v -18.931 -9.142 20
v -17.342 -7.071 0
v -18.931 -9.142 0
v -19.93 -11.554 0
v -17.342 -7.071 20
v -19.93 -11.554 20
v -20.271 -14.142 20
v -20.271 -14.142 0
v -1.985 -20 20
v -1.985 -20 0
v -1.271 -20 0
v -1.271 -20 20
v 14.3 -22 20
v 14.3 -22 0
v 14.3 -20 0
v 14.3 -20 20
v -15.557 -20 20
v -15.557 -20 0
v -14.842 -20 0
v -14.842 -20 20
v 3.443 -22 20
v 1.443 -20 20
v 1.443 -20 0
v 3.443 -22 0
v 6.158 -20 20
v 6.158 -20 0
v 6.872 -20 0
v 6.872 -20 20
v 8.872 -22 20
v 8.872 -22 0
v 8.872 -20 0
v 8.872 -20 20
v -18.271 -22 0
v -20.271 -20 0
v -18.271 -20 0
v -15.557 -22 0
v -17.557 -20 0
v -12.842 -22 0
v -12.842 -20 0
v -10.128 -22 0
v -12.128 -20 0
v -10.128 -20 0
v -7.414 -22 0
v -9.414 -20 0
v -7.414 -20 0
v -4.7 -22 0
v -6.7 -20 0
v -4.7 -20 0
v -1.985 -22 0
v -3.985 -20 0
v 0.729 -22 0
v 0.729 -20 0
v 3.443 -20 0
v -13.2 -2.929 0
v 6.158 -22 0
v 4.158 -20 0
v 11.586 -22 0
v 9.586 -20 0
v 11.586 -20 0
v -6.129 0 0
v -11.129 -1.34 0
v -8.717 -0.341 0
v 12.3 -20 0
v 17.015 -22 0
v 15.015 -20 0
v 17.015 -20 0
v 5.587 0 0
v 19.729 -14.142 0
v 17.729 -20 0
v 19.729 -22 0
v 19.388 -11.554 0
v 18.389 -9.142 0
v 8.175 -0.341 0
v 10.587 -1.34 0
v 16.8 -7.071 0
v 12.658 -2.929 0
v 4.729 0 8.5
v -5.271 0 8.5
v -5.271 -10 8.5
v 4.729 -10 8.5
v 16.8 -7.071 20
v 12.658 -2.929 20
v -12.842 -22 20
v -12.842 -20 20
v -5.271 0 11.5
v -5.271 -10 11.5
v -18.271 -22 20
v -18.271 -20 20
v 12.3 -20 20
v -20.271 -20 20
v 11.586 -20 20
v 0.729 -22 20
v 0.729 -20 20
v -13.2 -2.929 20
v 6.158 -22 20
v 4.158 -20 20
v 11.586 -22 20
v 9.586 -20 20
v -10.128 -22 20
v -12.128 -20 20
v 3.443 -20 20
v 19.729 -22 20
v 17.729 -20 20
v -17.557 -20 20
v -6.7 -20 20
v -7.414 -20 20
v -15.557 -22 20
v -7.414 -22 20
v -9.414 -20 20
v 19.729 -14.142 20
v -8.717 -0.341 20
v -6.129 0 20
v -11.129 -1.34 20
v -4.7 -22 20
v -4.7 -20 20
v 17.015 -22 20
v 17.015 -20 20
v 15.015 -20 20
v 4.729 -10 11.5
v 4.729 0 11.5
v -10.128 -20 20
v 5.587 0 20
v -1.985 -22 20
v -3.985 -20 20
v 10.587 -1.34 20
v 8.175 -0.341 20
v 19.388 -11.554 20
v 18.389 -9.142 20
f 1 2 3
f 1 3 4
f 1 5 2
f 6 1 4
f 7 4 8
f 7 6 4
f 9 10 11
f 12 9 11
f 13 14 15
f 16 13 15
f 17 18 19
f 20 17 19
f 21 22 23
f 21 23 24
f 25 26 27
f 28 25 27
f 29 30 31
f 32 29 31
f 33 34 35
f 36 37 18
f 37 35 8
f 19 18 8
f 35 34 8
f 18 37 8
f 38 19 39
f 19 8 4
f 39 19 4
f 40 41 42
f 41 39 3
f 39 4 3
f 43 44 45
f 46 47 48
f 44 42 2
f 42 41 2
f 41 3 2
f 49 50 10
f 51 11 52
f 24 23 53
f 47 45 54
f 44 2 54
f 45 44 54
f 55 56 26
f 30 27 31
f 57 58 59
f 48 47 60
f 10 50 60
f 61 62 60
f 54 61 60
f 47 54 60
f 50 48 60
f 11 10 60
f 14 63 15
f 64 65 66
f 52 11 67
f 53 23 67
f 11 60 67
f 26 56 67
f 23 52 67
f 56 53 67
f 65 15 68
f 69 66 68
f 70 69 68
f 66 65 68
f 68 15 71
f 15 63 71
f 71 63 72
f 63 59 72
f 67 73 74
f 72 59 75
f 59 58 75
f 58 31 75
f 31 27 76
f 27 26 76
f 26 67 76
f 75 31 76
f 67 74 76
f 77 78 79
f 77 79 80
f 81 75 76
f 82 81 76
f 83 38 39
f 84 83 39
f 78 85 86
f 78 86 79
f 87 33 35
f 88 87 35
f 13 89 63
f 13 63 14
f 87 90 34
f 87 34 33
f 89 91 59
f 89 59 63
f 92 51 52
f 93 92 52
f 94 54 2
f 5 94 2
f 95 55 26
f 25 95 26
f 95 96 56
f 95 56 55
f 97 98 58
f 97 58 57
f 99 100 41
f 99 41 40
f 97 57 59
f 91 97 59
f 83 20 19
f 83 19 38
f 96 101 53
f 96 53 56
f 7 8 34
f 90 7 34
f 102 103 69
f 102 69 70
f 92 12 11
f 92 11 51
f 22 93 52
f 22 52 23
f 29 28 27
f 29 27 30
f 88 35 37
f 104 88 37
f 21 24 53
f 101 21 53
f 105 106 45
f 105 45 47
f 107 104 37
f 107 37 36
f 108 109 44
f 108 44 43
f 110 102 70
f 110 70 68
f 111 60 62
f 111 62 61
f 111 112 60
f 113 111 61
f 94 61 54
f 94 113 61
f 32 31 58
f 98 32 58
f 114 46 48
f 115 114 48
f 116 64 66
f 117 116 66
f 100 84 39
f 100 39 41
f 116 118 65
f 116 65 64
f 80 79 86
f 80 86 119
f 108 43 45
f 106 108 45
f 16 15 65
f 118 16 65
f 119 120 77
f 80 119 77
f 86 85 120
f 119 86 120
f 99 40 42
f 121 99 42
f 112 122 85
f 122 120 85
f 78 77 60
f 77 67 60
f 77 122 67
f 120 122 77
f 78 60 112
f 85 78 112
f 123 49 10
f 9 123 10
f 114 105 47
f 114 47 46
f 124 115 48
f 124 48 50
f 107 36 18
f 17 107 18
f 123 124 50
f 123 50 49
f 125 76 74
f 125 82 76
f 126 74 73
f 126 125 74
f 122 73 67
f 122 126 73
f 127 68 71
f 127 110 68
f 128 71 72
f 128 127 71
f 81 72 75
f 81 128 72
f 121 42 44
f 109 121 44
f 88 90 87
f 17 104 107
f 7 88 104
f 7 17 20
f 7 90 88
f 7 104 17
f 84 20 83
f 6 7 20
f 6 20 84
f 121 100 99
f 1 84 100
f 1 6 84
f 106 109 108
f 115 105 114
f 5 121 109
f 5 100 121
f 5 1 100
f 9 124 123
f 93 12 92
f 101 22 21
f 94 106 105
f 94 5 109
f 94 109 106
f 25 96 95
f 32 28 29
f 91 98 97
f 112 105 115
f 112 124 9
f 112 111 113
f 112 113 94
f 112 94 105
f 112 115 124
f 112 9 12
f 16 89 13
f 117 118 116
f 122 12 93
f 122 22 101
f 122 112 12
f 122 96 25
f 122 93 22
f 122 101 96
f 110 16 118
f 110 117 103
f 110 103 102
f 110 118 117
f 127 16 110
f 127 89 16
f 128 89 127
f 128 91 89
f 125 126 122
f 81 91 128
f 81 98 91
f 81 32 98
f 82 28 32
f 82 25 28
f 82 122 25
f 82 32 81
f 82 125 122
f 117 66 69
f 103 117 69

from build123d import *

# Parameters (mm, degrees)
BOSS_EXTRUDE1_DEPTH = 20
SKETCH2_W           = 10
SKETCH2_H           = 3
CUT_EXTRUDE1_DEPTH  = 10
FILLET_1_R          = 10


with BuildPart() as part:
    # Sketch1 → Boss-Extrude1 (new body)
    with BuildSketch(Plane.XY):
        Polygon((17.014668726, -22), (17.014668726, -20), (17.728954441, -20), (19.728954441, -22), (19.728954441, -20), (19.728954441, -10), (9.728954441, 0), (-10.271045559, 0), (-20.271045559, -10), (-20.271045559, -20), (-18.271045559, -22), (-18.271045559, -20), (-17.556759845, -20), (-15.556759845, -22), (-15.556759845, -20), (-14.842474131, -20), (-12.842474131, -22), (-12.842474131, -20), (-12.128188417, -20), (-10.128188417, -22), (-10.128188417, -20), (-9.413902702, -20), (-7.413902702, -22), (-7.413902702, -20), (-6.699616988, -20), (-4.699616988, -22), (-4.699616988, -20), (-3.985331274, -20), (-1.985331274, -22), (-1.985331274, -20), (-1.271045559, -20), (0.728954441, -22), (0.728954441, -20), (1.443240155, -20), (3.443240155, -22), (3.443240155, -20), (4.157525869, -20), (6.157525869, -22), (6.157525869, -20), (6.871811583, -20), (8.871811583, -22), (8.871811583, -20), (9.586097298, -20), (11.586097298, -22), (11.586097298, -20), (12.300383012, -20), (14.300383012, -22), (14.300383012, -20), (15.014668726, -20), align=None)
    extrude(amount=BOSS_EXTRUDE1_DEPTH)

    # Sketch2 → Cut-Extrude1 (cut)
    with BuildSketch(Plane(origin=(0, 0, 0), x_dir=(1, 0, 0), z_dir=(0, 1, 0))):
        with Locations((-0.271045559, -10)):
            Rectangle(SKETCH2_W, SKETCH2_H)
    extrude(amount=-CUT_EXTRUDE1_DEPTH, mode=Mode.SUBTRACT)

    # Скругление1
    fillet_1_edges = [part.edges().sort_by_distance(p)[0] for p in [
        (-20.271045559, -10, 10),
        (-10.271045559, 0, 10),
        (9.728954441, 0, 10),
        (19.728954441, -10, 10),
    ]]
    fillet(fillet_1_edges, radius=FILLET_1_R)


solid = part.part
